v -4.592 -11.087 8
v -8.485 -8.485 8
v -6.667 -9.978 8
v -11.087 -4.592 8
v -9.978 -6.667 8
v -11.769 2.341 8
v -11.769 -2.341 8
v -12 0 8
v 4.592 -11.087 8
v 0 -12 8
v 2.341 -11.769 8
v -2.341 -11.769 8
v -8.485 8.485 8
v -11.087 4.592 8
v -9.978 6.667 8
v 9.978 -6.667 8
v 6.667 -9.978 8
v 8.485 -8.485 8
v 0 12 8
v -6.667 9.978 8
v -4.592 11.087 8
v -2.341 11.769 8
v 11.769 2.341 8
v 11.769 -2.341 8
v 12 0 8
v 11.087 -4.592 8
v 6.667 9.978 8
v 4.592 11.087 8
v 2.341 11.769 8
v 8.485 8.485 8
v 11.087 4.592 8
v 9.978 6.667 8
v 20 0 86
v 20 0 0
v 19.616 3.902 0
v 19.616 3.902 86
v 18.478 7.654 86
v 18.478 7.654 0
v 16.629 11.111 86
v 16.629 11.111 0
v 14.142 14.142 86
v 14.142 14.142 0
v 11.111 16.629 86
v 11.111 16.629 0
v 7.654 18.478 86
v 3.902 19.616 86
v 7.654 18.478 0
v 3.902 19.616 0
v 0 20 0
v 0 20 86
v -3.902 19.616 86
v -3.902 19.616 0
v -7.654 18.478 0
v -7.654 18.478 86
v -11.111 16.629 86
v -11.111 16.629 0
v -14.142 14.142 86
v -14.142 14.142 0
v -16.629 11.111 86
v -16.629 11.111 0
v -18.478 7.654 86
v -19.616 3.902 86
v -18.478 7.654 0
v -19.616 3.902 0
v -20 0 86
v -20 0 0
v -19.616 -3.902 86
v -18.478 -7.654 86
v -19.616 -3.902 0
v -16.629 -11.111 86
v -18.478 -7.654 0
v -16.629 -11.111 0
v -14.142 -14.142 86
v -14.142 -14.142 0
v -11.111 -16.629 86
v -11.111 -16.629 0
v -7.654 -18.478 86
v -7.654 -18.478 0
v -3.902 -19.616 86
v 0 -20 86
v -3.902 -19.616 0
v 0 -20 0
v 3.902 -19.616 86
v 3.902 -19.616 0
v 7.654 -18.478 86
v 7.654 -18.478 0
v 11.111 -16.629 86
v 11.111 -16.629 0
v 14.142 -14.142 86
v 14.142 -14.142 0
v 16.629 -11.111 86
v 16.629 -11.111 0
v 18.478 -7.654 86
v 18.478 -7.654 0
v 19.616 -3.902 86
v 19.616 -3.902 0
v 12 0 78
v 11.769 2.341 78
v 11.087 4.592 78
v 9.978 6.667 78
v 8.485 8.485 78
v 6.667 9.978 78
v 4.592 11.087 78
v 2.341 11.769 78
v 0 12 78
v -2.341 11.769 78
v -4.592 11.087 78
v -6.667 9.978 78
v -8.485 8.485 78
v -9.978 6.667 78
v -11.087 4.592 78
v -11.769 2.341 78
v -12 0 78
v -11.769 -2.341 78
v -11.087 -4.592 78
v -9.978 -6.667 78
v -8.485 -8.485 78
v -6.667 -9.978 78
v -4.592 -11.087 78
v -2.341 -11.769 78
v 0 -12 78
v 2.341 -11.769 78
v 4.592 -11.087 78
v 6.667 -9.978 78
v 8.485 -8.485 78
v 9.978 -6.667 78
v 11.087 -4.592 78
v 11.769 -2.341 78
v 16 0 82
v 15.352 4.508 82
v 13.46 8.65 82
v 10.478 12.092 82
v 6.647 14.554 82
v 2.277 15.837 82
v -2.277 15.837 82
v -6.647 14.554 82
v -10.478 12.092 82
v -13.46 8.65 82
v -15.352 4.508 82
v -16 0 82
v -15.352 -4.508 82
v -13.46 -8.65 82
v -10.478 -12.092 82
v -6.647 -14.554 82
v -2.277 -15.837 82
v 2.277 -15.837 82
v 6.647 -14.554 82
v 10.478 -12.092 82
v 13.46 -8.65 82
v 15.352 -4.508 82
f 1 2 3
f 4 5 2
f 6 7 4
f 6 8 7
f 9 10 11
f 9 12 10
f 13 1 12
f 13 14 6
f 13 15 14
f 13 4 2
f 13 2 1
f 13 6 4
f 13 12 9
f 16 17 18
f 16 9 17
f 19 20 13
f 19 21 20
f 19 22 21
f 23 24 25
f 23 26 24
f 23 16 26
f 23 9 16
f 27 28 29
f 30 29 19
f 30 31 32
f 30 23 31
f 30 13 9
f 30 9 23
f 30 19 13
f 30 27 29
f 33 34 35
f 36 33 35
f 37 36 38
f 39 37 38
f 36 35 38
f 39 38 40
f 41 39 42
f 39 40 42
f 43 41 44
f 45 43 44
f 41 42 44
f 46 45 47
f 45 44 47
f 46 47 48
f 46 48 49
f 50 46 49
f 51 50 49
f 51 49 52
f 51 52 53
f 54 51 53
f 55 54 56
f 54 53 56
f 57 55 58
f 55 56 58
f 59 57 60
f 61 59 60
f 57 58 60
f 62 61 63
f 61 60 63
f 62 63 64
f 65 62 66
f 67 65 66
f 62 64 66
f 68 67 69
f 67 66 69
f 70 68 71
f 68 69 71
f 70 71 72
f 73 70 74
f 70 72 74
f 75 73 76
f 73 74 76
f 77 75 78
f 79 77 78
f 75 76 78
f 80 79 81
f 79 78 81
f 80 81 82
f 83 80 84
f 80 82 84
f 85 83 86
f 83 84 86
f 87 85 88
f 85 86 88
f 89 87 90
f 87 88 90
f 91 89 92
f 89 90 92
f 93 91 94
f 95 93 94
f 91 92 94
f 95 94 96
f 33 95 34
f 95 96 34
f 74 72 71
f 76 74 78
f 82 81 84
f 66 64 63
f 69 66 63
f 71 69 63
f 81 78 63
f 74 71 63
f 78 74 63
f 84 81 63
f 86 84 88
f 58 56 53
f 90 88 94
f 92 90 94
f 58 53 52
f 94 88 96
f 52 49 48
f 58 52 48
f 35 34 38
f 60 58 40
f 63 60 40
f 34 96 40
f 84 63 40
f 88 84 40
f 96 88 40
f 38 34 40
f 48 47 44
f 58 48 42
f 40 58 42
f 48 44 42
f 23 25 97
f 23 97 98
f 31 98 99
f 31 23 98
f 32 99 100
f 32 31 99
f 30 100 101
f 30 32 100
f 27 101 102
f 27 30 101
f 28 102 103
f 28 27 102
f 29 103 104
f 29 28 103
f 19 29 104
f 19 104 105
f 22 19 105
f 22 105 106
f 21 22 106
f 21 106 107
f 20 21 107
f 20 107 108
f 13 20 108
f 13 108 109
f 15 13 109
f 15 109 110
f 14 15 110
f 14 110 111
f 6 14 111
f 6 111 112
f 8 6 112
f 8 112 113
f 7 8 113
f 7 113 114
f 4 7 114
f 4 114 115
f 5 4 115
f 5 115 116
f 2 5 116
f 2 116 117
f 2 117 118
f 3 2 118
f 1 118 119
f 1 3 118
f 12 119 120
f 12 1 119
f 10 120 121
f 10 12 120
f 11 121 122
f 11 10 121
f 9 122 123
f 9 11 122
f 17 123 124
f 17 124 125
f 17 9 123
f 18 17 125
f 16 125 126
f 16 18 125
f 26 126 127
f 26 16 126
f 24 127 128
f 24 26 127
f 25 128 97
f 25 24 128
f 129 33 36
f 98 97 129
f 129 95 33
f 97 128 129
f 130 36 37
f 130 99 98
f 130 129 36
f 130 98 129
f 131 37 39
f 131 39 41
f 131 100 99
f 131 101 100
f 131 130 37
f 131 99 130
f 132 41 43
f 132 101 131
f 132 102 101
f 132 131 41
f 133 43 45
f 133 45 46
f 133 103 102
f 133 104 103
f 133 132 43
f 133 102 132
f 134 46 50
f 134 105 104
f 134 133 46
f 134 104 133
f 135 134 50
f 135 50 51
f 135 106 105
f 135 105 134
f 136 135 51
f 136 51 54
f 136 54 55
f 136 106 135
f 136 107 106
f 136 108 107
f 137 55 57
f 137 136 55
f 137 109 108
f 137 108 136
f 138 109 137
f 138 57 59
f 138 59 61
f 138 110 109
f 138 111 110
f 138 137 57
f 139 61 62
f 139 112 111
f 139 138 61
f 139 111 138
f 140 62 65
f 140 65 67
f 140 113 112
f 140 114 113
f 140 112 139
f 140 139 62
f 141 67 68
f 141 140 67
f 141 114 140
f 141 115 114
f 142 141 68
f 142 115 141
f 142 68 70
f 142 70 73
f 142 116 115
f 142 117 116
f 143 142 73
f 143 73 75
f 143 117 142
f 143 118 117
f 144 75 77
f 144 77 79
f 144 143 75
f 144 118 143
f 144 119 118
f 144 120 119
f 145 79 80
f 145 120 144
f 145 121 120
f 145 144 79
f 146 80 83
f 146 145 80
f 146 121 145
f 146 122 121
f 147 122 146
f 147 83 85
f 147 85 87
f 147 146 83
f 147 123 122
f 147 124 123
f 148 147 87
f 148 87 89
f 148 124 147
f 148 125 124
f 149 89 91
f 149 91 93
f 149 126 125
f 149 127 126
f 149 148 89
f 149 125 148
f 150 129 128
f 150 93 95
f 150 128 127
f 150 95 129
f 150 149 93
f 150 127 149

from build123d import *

# Parameters (mm, degrees)
F0_R     = 20
F1_DEPTH = 86
F2_T     = -8
F3_SIZE  = 7.99999


# Not quite as in the source:
# - a fillet or chamfer is up to 0.001 mm smaller than in the source, because OpenCascade refuses the exact size


with BuildPart() as f1:
    # F0 (on Top) → F1 (new body)
    with BuildSketch(Plane.XY):
        Circle(F0_R)
    extrude(amount=F1_DEPTH)

    # F2
    f2_openings = [f1.faces().sort_by_distance(p)[0] for p in [
        (0, 0, 86),
    ]]
    offset(amount=F2_T, openings=f2_openings)

    # F3 (size 8 in the source; OpenCascade refuses exactly that, so slightly less here)
    f3_edges = [f1.edges().sort_by_distance(p)[0] for p in [
        (-12, 0, 86),
    ]]
    chamfer(f3_edges, length=F3_SIZE)


solid = f1.part
